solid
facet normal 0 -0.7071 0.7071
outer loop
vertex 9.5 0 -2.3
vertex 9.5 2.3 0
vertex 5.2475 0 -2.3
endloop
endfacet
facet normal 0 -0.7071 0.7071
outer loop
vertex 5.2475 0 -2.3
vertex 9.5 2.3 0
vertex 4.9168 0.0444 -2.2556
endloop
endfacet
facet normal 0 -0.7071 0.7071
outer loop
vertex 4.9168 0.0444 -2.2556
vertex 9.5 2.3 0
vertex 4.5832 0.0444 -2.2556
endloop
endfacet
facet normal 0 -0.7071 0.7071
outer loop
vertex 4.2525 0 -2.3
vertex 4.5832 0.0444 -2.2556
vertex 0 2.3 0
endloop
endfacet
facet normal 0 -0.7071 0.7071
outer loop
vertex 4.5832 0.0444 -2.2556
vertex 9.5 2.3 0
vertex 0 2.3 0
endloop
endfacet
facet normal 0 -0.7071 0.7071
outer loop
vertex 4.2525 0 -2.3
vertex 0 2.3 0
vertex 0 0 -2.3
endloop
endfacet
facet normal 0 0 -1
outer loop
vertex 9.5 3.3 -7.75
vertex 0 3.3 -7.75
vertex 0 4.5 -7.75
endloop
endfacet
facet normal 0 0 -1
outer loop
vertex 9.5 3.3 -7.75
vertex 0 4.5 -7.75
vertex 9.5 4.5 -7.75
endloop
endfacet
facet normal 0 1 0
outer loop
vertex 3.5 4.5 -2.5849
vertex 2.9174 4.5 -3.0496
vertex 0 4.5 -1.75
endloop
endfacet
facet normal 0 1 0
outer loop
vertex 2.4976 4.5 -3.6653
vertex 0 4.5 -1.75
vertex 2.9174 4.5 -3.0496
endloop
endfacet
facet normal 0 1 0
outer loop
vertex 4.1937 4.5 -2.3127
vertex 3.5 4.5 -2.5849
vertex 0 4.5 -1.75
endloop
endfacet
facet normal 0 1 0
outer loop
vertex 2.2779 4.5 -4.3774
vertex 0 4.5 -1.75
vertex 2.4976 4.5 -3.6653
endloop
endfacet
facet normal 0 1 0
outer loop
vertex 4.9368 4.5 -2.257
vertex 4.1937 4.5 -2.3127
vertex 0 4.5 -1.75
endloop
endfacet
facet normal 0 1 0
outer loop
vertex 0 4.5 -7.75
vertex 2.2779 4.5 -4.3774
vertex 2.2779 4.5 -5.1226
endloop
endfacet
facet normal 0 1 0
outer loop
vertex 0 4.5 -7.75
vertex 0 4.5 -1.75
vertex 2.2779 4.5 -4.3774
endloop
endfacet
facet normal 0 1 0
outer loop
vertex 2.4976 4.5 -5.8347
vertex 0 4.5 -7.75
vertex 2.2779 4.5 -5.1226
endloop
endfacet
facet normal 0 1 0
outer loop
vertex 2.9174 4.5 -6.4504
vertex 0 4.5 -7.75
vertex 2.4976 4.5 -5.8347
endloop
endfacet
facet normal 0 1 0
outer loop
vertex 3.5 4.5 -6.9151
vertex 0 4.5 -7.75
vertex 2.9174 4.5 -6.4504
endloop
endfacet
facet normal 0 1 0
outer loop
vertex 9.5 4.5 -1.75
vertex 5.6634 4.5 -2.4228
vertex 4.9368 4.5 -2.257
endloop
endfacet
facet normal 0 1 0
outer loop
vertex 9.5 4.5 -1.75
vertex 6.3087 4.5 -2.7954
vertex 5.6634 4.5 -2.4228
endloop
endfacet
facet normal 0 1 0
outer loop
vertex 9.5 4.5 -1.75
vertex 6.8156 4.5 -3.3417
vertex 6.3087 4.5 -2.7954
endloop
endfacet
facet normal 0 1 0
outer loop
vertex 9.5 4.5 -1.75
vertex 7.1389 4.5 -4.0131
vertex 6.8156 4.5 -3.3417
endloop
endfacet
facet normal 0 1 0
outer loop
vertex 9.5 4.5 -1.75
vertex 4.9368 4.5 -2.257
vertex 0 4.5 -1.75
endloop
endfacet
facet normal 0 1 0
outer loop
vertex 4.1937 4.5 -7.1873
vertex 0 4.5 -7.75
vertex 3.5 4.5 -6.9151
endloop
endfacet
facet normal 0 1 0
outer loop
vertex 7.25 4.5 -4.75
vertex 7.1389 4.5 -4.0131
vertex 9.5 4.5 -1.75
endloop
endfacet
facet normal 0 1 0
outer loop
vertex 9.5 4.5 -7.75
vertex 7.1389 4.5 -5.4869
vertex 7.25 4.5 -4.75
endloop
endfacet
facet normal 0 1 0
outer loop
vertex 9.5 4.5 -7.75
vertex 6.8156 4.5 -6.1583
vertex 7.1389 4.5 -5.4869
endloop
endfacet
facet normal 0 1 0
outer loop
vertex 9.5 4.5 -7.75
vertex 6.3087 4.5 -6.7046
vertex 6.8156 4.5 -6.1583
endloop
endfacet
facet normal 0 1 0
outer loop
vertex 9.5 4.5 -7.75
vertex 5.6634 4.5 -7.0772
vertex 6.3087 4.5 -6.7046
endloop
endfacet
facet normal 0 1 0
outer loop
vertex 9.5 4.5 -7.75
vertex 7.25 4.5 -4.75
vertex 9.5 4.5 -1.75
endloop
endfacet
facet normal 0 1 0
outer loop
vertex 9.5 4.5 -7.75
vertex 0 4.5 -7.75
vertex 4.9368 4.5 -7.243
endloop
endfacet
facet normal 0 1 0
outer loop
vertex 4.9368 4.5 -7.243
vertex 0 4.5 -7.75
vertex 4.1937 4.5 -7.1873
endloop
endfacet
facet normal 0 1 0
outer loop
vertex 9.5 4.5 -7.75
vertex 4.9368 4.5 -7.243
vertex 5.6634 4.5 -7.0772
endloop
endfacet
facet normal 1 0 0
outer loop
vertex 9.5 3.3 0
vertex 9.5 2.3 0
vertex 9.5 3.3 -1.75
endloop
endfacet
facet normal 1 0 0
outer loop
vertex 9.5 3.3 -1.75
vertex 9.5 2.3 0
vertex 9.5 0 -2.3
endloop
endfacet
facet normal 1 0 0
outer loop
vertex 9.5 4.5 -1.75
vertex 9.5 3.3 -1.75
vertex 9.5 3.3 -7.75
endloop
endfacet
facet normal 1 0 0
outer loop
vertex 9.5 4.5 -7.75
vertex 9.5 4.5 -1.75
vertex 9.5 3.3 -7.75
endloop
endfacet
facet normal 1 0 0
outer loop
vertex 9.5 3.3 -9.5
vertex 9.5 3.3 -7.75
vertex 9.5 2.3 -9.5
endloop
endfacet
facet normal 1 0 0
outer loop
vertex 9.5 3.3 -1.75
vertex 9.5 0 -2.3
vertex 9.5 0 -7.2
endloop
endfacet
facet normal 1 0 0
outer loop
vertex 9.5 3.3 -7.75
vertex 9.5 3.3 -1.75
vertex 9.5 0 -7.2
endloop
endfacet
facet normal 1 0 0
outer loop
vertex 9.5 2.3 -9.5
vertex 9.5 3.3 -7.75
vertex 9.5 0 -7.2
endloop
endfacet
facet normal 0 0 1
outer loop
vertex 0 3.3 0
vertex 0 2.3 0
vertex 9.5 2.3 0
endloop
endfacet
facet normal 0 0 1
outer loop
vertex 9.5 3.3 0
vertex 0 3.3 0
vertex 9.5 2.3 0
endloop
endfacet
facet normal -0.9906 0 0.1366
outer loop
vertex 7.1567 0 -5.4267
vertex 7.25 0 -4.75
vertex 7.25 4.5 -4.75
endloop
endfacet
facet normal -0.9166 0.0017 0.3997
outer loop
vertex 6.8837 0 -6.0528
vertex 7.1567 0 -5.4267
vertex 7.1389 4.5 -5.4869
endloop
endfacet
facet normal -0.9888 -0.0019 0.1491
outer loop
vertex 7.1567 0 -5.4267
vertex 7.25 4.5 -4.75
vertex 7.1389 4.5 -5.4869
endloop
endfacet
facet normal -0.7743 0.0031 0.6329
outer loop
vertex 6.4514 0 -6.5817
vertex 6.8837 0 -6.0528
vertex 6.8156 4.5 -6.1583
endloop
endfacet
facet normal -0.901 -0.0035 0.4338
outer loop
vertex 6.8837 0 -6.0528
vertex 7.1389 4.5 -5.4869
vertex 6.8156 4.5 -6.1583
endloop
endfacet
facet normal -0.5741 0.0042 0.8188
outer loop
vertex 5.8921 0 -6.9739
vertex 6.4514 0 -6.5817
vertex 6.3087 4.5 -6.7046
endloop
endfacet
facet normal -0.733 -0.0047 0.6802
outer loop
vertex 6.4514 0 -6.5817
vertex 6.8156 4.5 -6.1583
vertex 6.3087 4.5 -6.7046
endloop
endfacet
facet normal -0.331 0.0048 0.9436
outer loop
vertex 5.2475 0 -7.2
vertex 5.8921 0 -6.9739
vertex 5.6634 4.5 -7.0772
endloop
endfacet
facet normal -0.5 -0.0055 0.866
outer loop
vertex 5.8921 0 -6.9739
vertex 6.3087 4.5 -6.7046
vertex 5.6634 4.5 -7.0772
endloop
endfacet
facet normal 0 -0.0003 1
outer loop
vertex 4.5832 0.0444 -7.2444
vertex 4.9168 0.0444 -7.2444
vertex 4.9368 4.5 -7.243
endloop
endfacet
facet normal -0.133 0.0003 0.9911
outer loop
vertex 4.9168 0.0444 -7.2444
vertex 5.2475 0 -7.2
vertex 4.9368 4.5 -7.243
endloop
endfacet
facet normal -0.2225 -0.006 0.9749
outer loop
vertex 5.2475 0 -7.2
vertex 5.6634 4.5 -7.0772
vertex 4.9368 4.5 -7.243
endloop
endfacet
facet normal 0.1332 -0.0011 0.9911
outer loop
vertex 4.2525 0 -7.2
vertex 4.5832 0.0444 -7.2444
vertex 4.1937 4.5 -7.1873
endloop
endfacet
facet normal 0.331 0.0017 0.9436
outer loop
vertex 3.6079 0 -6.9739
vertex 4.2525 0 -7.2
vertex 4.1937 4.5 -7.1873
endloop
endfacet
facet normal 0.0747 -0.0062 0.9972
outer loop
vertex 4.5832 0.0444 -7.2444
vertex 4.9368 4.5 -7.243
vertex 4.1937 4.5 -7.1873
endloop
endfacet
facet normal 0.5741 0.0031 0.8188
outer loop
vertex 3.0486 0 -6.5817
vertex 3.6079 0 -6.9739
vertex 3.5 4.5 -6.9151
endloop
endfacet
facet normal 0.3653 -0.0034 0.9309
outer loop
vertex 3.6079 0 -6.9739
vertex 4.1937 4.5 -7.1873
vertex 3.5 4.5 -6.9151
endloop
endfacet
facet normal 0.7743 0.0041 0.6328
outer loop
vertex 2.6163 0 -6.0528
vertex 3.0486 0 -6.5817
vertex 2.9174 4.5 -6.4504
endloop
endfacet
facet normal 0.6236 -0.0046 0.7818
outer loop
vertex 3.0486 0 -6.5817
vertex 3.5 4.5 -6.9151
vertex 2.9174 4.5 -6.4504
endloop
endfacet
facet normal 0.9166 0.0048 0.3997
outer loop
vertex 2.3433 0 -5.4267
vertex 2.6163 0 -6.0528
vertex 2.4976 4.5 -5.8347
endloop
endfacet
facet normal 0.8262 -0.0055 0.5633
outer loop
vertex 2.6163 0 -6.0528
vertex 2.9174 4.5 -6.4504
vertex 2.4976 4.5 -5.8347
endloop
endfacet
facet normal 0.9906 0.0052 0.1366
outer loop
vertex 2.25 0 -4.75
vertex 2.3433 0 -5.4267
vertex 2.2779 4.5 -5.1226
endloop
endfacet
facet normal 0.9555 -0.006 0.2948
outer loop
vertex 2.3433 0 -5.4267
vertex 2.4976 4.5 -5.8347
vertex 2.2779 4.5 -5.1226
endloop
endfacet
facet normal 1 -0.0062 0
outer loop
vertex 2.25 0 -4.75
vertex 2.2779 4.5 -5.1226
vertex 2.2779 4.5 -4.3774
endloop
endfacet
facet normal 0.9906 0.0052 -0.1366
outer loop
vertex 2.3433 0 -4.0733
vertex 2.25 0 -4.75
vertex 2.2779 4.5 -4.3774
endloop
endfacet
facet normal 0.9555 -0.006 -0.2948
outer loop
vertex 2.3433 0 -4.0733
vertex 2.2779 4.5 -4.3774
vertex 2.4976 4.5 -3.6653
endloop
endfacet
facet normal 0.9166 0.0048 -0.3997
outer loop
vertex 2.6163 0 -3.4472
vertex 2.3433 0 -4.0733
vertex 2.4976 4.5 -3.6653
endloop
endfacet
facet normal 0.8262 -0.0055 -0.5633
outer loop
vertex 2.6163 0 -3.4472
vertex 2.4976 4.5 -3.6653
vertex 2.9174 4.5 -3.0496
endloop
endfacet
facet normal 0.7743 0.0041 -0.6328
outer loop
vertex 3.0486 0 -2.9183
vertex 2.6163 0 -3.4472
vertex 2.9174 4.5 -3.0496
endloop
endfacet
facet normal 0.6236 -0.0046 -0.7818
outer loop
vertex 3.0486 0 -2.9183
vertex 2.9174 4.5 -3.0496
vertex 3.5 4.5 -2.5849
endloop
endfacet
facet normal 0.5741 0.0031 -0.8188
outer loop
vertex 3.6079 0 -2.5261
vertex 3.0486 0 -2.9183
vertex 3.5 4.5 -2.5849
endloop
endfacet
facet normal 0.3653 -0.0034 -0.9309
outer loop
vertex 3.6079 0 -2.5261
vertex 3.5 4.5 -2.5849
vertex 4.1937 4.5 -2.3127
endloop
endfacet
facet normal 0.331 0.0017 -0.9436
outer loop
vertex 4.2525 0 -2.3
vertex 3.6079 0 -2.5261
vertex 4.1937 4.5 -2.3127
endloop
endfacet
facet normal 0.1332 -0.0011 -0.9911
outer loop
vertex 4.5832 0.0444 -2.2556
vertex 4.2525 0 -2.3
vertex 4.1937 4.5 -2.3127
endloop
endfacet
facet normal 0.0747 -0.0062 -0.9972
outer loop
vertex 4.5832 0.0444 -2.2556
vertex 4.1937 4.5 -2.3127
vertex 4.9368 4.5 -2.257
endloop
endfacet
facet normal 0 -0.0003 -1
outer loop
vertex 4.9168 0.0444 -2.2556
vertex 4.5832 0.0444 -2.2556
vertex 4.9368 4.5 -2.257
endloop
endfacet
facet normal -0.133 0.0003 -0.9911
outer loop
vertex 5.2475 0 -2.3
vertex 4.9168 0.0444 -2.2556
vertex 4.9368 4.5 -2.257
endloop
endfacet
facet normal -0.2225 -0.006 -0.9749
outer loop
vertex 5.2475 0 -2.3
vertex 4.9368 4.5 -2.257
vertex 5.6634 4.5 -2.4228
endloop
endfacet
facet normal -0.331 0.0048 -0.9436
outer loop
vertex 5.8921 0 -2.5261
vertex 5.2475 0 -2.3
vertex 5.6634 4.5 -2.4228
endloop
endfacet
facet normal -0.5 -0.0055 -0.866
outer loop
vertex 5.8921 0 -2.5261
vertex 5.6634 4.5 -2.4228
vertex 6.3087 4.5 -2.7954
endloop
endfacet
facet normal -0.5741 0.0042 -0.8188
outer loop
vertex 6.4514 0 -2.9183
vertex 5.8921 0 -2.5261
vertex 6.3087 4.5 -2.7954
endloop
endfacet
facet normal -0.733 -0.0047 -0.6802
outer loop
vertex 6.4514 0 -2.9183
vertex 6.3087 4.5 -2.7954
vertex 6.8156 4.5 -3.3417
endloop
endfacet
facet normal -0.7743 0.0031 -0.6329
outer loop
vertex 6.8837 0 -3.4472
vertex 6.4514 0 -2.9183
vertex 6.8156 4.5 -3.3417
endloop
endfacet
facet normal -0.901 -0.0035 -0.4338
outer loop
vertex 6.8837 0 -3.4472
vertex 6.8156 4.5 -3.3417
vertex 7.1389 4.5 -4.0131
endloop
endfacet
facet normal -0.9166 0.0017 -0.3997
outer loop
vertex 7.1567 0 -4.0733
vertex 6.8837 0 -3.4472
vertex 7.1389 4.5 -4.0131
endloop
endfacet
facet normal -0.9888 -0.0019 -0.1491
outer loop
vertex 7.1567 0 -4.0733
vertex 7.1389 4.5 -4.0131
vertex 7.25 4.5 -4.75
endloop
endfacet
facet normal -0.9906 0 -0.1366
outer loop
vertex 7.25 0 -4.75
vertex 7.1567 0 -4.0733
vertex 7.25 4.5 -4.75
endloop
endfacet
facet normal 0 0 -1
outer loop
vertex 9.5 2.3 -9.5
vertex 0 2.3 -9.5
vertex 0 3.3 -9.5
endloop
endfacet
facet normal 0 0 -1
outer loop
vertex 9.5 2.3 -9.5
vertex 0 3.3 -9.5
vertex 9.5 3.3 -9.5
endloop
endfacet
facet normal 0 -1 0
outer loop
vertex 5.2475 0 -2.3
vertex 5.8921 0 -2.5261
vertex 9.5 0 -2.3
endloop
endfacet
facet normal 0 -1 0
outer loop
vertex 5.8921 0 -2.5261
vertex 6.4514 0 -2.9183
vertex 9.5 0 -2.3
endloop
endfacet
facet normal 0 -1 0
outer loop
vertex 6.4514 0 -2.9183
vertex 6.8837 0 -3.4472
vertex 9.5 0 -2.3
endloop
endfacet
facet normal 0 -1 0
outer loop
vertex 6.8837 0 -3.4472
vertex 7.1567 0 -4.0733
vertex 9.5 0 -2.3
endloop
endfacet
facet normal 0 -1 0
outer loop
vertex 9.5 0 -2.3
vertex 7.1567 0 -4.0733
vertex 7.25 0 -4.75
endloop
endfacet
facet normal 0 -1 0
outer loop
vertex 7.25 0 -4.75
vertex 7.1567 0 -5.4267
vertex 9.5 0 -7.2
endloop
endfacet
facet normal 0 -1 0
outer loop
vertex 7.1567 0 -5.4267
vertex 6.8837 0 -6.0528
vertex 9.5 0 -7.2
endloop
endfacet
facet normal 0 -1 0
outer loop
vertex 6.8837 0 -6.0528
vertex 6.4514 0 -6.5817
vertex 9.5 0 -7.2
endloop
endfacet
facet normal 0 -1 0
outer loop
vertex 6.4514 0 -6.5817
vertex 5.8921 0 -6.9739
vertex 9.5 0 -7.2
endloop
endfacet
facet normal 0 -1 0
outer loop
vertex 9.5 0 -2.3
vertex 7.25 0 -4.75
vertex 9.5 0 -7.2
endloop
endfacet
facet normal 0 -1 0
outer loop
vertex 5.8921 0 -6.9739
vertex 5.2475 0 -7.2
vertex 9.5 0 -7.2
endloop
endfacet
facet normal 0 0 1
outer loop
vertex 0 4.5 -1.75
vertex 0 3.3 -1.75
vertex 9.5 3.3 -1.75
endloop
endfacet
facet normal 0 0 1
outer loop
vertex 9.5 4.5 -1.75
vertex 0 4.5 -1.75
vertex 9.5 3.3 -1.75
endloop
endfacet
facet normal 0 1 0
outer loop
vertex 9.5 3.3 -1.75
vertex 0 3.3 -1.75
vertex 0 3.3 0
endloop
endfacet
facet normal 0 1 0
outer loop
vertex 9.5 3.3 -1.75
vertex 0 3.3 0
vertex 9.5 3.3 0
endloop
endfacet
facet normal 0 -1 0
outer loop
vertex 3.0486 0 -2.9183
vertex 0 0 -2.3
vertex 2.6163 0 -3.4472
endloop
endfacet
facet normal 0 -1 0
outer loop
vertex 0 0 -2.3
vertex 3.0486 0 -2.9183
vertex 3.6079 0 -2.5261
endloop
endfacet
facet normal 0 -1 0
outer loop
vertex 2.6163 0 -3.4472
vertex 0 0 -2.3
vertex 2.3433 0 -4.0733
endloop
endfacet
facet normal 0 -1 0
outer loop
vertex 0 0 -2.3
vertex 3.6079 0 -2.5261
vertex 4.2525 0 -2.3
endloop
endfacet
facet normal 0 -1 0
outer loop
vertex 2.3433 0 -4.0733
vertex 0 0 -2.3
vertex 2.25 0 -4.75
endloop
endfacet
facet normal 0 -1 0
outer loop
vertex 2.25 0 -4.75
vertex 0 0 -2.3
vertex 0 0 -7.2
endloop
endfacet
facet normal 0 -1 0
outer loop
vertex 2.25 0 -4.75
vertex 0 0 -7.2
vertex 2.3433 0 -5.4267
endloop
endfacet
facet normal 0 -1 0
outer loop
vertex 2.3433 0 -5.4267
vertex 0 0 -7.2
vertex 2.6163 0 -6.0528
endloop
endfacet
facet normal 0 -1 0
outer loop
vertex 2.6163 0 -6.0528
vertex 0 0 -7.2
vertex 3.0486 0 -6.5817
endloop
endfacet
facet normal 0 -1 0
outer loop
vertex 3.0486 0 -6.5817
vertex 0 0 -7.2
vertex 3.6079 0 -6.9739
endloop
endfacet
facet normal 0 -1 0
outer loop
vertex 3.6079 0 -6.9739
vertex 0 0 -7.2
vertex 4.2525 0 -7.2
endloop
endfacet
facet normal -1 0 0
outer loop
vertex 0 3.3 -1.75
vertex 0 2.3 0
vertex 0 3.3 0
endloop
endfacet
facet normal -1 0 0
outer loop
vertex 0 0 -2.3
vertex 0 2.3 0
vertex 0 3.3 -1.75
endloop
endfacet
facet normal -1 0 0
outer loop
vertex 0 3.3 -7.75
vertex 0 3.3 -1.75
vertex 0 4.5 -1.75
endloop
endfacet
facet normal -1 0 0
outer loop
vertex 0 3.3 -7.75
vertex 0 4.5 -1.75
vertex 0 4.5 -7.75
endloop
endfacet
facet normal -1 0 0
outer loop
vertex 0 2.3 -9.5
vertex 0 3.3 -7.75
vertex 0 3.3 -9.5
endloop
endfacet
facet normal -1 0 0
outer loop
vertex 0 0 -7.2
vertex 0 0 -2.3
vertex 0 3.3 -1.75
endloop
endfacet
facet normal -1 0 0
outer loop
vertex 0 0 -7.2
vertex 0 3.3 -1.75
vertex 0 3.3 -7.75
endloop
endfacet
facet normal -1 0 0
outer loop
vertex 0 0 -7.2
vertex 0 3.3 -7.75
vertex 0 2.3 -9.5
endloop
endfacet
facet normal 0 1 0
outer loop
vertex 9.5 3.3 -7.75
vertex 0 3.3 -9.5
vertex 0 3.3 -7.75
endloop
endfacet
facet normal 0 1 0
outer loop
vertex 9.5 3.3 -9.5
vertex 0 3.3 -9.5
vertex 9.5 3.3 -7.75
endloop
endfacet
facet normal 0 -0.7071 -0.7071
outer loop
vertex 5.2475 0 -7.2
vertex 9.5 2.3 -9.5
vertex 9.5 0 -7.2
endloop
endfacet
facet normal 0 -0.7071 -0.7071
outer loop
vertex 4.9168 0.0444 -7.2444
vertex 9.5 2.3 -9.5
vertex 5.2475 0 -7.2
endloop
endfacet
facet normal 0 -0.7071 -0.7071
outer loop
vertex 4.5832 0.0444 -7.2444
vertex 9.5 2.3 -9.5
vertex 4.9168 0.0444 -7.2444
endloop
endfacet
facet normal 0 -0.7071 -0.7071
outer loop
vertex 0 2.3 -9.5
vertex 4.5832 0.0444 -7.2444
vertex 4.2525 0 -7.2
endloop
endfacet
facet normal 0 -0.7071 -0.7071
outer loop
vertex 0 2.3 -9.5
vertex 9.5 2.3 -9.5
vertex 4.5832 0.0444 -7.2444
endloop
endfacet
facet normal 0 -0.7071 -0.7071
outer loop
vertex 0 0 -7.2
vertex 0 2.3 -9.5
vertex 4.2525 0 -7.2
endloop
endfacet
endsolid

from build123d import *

# Parameters (mm, degrees)
SKETCH_1_W          = 9.5
SKETCH_1_H          = 9.5
EXTRUDE_1_DEPTH     = 3.3
SKETCH_2_W          = 9.5
SKETCH_2_H          = 6
EXTRUDE_2_DEPTH     = 1.2
SKETCH_3_R          = 2.5
CUT_EXTRUDE_1_DEPTH = 5.5
CUT_EXTRUDE_2_DEPTH = 10.5


with BuildPart() as part:
    # 草图1 → 凸台-拉伸1 (new body)
    with BuildSketch(Plane(origin=(0, 0, 0), x_dir=(1, 0, 0), z_dir=(0, 1, 0))):
        with Locations((4.75, 4.75)):
            Rectangle(SKETCH_1_W, SKETCH_1_H)
    extrude(amount=EXTRUDE_1_DEPTH)

    # 草图2 → 凸台-拉伸2 (add)
    with BuildSketch(Plane(origin=(0, 3.3, 0), x_dir=(1, 0, 0), z_dir=(0, 1, 0))):
        with Locations((4.75, 4.75)):
            Rectangle(SKETCH_2_W, SKETCH_2_H)
    extrude(amount=EXTRUDE_2_DEPTH)

    # 草图3 → 切除-拉伸1 (cut, through all)
    with BuildSketch(Plane(origin=(0, 4.5, 0), x_dir=(1, 0, 0), z_dir=(0, 1, 0))):
        with Locations((4.75, 4.75)):
            Circle(SKETCH_3_R)
    extrude(amount=-CUT_EXTRUDE_1_DEPTH, mode=Mode.SUBTRACT)

    # 草图4 → 切除-拉伸2 (cut, through all)
    with BuildSketch(Plane.ZY):
        Polygon((-9.5, 2.3), (-7.2, 0), (-9.5, 0), align=None)
        Polygon((0, 2.3), (-2.3, 0), (0, 0), align=None)
    extrude(amount=-CUT_EXTRUDE_2_DEPTH, mode=Mode.SUBTRACT)


solid = part.part
